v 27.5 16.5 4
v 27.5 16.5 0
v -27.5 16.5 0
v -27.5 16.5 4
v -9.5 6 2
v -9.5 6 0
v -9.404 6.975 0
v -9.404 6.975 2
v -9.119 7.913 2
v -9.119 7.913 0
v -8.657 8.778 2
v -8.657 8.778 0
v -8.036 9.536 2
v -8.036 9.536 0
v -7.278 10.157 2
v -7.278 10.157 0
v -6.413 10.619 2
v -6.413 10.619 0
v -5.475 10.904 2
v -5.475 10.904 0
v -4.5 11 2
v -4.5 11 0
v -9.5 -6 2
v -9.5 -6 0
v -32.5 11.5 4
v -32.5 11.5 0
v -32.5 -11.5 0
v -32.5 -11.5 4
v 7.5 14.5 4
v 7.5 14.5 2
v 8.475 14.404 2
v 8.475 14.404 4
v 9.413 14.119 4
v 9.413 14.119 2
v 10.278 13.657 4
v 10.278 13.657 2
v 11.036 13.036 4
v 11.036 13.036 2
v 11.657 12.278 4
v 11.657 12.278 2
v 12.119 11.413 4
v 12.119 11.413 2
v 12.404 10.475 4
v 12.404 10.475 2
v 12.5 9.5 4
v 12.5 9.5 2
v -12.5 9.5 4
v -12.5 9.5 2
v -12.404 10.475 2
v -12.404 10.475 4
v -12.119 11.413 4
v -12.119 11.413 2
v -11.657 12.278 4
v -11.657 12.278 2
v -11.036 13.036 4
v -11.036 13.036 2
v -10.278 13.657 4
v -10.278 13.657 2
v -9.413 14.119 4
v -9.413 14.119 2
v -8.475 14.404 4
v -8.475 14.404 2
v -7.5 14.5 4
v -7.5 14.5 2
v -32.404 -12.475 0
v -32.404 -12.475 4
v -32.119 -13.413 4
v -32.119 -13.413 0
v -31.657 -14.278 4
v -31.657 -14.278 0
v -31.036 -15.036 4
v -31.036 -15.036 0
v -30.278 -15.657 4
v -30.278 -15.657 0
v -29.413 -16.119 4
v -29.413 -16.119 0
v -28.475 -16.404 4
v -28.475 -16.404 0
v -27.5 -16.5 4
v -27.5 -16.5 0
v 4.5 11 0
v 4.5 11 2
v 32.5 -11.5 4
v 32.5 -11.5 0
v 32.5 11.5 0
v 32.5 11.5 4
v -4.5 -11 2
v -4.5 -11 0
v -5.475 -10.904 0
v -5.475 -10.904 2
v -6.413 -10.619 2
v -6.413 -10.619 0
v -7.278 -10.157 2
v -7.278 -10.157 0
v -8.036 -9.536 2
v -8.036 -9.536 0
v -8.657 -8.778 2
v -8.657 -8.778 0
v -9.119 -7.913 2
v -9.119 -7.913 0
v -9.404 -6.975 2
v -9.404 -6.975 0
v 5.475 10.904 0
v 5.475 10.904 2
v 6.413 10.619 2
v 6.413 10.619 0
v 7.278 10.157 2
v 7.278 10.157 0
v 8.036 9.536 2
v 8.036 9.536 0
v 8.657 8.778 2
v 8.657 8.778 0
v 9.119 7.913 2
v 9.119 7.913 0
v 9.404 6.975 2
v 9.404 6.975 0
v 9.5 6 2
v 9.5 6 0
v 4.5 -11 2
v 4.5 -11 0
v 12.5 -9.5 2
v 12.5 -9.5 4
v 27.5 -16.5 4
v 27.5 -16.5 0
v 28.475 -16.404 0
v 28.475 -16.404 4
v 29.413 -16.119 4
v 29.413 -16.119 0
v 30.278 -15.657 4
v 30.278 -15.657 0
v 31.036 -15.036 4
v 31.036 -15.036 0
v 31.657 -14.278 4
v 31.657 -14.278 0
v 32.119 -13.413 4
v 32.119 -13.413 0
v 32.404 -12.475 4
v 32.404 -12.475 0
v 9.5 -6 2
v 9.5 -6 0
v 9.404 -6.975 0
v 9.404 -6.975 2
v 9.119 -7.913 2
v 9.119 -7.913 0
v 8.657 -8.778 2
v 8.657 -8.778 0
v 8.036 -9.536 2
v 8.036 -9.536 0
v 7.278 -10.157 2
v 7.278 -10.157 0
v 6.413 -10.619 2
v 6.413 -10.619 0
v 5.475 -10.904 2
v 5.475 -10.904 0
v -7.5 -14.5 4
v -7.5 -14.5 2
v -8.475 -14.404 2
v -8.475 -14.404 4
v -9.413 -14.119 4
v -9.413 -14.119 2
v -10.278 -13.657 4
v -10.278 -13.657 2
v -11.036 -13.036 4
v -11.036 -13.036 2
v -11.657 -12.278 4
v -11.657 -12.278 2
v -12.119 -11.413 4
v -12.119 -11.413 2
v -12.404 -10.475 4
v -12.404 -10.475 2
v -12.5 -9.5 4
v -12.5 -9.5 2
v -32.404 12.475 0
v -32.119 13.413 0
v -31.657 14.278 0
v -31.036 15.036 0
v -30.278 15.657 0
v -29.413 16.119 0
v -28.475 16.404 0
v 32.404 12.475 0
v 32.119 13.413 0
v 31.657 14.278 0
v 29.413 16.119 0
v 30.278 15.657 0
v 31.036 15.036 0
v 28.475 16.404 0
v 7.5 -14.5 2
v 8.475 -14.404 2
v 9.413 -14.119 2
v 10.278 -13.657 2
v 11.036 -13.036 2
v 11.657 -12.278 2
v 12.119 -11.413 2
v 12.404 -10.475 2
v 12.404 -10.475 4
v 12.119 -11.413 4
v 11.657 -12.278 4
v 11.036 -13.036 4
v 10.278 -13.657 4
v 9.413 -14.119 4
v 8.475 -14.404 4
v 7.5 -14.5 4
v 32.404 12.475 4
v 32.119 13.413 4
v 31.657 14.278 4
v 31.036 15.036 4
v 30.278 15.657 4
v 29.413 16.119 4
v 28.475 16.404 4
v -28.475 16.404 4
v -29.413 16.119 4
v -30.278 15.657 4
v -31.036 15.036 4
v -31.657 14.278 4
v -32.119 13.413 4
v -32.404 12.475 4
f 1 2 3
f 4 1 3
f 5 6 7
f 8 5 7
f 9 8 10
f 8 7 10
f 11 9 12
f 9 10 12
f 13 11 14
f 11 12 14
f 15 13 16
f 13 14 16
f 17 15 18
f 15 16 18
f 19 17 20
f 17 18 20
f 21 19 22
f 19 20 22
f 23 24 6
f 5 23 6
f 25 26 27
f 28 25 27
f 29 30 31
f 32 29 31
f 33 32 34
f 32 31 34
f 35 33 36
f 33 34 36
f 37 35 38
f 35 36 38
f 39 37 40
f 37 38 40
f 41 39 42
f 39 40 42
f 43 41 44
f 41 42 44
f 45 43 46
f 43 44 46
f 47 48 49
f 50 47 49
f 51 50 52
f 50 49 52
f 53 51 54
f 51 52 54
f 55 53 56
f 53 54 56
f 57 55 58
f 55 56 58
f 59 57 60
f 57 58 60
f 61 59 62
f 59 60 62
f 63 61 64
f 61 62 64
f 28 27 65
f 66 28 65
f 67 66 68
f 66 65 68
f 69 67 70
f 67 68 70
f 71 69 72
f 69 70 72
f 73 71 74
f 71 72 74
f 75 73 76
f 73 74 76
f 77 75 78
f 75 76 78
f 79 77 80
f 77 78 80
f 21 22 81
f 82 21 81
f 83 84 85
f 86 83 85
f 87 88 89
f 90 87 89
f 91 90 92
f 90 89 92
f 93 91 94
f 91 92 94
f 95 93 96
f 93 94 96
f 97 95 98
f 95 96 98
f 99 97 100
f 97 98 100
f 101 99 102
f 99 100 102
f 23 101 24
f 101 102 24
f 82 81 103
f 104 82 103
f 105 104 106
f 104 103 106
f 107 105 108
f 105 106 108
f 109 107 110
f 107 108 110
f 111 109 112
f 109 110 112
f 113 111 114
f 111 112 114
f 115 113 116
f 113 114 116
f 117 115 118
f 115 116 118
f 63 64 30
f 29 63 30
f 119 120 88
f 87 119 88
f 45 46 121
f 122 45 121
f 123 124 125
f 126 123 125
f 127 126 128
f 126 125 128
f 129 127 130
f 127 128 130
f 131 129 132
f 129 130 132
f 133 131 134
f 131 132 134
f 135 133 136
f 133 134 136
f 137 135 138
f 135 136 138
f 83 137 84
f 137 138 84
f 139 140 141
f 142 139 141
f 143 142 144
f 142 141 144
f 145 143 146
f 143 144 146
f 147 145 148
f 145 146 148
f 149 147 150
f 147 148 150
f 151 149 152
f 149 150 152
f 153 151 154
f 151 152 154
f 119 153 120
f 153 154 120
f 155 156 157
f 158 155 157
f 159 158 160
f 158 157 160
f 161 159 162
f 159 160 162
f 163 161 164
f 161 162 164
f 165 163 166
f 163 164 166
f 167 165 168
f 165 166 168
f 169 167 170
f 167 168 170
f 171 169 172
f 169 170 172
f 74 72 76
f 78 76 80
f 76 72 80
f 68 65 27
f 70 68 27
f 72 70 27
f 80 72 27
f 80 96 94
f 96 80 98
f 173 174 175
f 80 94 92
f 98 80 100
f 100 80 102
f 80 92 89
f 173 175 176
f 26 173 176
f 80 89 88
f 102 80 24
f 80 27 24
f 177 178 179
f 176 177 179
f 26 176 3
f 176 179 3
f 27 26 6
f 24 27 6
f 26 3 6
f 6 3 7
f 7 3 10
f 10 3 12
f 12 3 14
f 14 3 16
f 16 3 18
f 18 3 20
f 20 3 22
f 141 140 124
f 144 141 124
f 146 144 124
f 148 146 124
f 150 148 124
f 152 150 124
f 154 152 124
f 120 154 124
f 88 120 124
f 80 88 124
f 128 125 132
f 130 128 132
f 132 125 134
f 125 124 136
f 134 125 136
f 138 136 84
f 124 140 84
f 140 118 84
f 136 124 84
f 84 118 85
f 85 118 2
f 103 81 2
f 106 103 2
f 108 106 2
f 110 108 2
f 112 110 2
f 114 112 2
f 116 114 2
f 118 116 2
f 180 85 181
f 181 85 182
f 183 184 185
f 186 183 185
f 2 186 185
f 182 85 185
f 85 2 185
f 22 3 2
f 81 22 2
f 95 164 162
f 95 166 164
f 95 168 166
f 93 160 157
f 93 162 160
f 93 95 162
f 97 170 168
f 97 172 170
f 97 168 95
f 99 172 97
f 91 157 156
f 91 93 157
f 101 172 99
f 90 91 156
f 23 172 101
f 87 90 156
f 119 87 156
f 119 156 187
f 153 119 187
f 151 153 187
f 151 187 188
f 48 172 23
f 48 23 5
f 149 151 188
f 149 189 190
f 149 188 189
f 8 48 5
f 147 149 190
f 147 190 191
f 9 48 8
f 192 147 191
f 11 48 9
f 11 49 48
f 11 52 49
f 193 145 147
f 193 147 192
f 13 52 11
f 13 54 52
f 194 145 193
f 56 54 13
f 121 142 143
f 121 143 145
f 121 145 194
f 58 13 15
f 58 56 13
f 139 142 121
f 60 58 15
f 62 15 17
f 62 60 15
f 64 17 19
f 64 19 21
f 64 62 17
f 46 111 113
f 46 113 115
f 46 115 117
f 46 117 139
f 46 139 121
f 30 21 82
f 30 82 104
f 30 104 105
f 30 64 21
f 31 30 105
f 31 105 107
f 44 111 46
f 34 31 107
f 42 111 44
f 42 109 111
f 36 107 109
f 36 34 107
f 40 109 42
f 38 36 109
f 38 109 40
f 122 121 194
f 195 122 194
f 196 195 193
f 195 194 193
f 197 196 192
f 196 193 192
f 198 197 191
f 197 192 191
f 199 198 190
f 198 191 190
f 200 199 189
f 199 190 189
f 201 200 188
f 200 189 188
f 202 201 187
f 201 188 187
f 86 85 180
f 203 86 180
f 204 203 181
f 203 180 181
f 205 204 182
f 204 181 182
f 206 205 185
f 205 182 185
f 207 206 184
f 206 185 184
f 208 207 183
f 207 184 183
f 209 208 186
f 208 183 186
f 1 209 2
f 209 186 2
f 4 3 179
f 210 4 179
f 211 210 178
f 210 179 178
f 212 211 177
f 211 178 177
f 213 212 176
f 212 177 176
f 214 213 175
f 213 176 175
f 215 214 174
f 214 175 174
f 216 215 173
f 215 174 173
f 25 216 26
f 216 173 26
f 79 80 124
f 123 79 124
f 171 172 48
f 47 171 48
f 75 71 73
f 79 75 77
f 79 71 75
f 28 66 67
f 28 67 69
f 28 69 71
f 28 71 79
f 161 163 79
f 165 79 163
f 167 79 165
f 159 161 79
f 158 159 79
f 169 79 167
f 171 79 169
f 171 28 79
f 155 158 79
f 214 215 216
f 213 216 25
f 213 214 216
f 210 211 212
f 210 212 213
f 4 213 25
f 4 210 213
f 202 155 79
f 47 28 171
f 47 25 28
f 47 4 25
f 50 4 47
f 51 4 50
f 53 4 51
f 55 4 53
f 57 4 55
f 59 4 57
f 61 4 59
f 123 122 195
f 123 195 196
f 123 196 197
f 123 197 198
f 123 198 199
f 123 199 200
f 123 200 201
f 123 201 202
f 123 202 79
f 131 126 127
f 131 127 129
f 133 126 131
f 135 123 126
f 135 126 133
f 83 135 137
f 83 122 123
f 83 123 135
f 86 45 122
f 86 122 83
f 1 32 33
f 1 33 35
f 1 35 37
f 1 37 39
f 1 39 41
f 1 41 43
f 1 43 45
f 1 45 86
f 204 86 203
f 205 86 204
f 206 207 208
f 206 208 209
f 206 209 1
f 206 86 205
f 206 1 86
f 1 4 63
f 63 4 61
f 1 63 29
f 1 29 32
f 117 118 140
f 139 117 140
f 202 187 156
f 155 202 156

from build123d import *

# Parameters (mm, degrees)
F1_DEPTH = 2
F2_DEPTH = 4


with BuildPart() as f1:
    # F0 (on Top) → F1 (new body)
    with BuildSketch(Plane.XY):
        with BuildLine():
            ThreePointArc((32.5, 11.5), (31.035534, 15.035534), (27.5, 16.5))
            Line((27.5, 16.5), (-27.5, 16.5))
            ThreePointArc((-27.5, 16.5), (-31.035534, 15.035534), (-32.5, 11.5))
            Line((-32.5, 11.5), (-32.5, -11.5))
            ThreePointArc((-32.5, -11.5), (-31.035534, -15.035534), (-27.5, -16.5))
            Line((-27.5, -16.5), (27.5, -16.5))
            ThreePointArc((27.5, -16.5), (31.035534, -15.035534), (32.5, -11.5))
            Line((32.5, -11.5), (32.5, 11.5))
        make_face()
        with BuildLine():
            Line((-7.5, 14.5), (7.5, 14.5))
            ThreePointArc((7.5, 14.5), (11.035534, 13.035534), (12.5, 9.5))
            Line((12.5, 9.5), (12.5, -9.5))
            ThreePointArc((12.5, -9.5), (11.035534, -13.035534), (7.5, -14.5))
            Line((7.5, -14.5), (-7.5, -14.5))
            ThreePointArc((-7.5, -14.5), (-11.035534, -13.035534), (-12.5, -9.5))
            Line((-12.5, -9.5), (-12.5, 9.5))
            ThreePointArc((-12.5, 9.5), (-11.035534, 13.035534), (-7.5, 14.5))
        make_face(mode=Mode.SUBTRACT)
        with BuildLine():
            ThreePointArc((12.5, 9.5), (11.035534, 13.035534), (7.5, 14.5))
            Line((7.5, 14.5), (-7.5, 14.5))
            ThreePointArc((-7.5, 14.5), (-11.035534, 13.035534), (-12.5, 9.5))
            Line((-12.5, 9.5), (-12.5, -9.5))
            ThreePointArc((-12.5, -9.5), (-11.035534, -13.035534), (-7.5, -14.5))
            Line((-7.5, -14.5), (7.5, -14.5))
            ThreePointArc((7.5, -14.5), (11.035534, -13.035534), (12.5, -9.5))
            Line((12.5, -9.5), (12.5, 9.5))
        make_face()
        with BuildLine():
            Line((-4.5, 11), (4.5, 11))
            ThreePointArc((4.5, 11), (8.035534, 9.535534), (9.5, 6))
            Line((9.5, 6), (9.5, -6))
            ThreePointArc((9.5, -6), (8.035534, -9.535534), (4.5, -11))
            Line((4.5, -11), (-4.5, -11))
            ThreePointArc((-4.5, -11), (-8.035534, -9.535534), (-9.5, -6))
            Line((-9.5, -6), (-9.5, 6))
            ThreePointArc((-9.5, 6), (-8.035534, 9.535534), (-4.5, 11))
        make_face(mode=Mode.SUBTRACT)
    extrude(amount=F1_DEPTH)

    # F0 (on Top) → F2 (join)
    with BuildSketch(Plane.XY):
        with BuildLine():
            ThreePointArc((32.5, 11.5), (31.035534, 15.035534), (27.5, 16.5))
            Line((27.5, 16.5), (-27.5, 16.5))
            ThreePointArc((-27.5, 16.5), (-31.035534, 15.035534), (-32.5, 11.5))
            Line((-32.5, 11.5), (-32.5, -11.5))
            ThreePointArc((-32.5, -11.5), (-31.035534, -15.035534), (-27.5, -16.5))
            Line((-27.5, -16.5), (27.5, -16.5))
            ThreePointArc((27.5, -16.5), (31.035534, -15.035534), (32.5, -11.5))
            Line((32.5, -11.5), (32.5, 11.5))
        make_face()
        with BuildLine():
            Line((-7.5, 14.5), (7.5, 14.5))
            ThreePointArc((7.5, 14.5), (11.035534, 13.035534), (12.5, 9.5))
            Line((12.5, 9.5), (12.5, -9.5))
            ThreePointArc((12.5, -9.5), (11.035534, -13.035534), (7.5, -14.5))
            Line((7.5, -14.5), (-7.5, -14.5))
            ThreePointArc((-7.5, -14.5), (-11.035534, -13.035534), (-12.5, -9.5))
            Line((-12.5, -9.5), (-12.5, 9.5))
            ThreePointArc((-12.5, 9.5), (-11.035534, 13.035534), (-7.5, 14.5))
        make_face(mode=Mode.SUBTRACT)
    extrude(amount=F2_DEPTH)


solid = f1.part
